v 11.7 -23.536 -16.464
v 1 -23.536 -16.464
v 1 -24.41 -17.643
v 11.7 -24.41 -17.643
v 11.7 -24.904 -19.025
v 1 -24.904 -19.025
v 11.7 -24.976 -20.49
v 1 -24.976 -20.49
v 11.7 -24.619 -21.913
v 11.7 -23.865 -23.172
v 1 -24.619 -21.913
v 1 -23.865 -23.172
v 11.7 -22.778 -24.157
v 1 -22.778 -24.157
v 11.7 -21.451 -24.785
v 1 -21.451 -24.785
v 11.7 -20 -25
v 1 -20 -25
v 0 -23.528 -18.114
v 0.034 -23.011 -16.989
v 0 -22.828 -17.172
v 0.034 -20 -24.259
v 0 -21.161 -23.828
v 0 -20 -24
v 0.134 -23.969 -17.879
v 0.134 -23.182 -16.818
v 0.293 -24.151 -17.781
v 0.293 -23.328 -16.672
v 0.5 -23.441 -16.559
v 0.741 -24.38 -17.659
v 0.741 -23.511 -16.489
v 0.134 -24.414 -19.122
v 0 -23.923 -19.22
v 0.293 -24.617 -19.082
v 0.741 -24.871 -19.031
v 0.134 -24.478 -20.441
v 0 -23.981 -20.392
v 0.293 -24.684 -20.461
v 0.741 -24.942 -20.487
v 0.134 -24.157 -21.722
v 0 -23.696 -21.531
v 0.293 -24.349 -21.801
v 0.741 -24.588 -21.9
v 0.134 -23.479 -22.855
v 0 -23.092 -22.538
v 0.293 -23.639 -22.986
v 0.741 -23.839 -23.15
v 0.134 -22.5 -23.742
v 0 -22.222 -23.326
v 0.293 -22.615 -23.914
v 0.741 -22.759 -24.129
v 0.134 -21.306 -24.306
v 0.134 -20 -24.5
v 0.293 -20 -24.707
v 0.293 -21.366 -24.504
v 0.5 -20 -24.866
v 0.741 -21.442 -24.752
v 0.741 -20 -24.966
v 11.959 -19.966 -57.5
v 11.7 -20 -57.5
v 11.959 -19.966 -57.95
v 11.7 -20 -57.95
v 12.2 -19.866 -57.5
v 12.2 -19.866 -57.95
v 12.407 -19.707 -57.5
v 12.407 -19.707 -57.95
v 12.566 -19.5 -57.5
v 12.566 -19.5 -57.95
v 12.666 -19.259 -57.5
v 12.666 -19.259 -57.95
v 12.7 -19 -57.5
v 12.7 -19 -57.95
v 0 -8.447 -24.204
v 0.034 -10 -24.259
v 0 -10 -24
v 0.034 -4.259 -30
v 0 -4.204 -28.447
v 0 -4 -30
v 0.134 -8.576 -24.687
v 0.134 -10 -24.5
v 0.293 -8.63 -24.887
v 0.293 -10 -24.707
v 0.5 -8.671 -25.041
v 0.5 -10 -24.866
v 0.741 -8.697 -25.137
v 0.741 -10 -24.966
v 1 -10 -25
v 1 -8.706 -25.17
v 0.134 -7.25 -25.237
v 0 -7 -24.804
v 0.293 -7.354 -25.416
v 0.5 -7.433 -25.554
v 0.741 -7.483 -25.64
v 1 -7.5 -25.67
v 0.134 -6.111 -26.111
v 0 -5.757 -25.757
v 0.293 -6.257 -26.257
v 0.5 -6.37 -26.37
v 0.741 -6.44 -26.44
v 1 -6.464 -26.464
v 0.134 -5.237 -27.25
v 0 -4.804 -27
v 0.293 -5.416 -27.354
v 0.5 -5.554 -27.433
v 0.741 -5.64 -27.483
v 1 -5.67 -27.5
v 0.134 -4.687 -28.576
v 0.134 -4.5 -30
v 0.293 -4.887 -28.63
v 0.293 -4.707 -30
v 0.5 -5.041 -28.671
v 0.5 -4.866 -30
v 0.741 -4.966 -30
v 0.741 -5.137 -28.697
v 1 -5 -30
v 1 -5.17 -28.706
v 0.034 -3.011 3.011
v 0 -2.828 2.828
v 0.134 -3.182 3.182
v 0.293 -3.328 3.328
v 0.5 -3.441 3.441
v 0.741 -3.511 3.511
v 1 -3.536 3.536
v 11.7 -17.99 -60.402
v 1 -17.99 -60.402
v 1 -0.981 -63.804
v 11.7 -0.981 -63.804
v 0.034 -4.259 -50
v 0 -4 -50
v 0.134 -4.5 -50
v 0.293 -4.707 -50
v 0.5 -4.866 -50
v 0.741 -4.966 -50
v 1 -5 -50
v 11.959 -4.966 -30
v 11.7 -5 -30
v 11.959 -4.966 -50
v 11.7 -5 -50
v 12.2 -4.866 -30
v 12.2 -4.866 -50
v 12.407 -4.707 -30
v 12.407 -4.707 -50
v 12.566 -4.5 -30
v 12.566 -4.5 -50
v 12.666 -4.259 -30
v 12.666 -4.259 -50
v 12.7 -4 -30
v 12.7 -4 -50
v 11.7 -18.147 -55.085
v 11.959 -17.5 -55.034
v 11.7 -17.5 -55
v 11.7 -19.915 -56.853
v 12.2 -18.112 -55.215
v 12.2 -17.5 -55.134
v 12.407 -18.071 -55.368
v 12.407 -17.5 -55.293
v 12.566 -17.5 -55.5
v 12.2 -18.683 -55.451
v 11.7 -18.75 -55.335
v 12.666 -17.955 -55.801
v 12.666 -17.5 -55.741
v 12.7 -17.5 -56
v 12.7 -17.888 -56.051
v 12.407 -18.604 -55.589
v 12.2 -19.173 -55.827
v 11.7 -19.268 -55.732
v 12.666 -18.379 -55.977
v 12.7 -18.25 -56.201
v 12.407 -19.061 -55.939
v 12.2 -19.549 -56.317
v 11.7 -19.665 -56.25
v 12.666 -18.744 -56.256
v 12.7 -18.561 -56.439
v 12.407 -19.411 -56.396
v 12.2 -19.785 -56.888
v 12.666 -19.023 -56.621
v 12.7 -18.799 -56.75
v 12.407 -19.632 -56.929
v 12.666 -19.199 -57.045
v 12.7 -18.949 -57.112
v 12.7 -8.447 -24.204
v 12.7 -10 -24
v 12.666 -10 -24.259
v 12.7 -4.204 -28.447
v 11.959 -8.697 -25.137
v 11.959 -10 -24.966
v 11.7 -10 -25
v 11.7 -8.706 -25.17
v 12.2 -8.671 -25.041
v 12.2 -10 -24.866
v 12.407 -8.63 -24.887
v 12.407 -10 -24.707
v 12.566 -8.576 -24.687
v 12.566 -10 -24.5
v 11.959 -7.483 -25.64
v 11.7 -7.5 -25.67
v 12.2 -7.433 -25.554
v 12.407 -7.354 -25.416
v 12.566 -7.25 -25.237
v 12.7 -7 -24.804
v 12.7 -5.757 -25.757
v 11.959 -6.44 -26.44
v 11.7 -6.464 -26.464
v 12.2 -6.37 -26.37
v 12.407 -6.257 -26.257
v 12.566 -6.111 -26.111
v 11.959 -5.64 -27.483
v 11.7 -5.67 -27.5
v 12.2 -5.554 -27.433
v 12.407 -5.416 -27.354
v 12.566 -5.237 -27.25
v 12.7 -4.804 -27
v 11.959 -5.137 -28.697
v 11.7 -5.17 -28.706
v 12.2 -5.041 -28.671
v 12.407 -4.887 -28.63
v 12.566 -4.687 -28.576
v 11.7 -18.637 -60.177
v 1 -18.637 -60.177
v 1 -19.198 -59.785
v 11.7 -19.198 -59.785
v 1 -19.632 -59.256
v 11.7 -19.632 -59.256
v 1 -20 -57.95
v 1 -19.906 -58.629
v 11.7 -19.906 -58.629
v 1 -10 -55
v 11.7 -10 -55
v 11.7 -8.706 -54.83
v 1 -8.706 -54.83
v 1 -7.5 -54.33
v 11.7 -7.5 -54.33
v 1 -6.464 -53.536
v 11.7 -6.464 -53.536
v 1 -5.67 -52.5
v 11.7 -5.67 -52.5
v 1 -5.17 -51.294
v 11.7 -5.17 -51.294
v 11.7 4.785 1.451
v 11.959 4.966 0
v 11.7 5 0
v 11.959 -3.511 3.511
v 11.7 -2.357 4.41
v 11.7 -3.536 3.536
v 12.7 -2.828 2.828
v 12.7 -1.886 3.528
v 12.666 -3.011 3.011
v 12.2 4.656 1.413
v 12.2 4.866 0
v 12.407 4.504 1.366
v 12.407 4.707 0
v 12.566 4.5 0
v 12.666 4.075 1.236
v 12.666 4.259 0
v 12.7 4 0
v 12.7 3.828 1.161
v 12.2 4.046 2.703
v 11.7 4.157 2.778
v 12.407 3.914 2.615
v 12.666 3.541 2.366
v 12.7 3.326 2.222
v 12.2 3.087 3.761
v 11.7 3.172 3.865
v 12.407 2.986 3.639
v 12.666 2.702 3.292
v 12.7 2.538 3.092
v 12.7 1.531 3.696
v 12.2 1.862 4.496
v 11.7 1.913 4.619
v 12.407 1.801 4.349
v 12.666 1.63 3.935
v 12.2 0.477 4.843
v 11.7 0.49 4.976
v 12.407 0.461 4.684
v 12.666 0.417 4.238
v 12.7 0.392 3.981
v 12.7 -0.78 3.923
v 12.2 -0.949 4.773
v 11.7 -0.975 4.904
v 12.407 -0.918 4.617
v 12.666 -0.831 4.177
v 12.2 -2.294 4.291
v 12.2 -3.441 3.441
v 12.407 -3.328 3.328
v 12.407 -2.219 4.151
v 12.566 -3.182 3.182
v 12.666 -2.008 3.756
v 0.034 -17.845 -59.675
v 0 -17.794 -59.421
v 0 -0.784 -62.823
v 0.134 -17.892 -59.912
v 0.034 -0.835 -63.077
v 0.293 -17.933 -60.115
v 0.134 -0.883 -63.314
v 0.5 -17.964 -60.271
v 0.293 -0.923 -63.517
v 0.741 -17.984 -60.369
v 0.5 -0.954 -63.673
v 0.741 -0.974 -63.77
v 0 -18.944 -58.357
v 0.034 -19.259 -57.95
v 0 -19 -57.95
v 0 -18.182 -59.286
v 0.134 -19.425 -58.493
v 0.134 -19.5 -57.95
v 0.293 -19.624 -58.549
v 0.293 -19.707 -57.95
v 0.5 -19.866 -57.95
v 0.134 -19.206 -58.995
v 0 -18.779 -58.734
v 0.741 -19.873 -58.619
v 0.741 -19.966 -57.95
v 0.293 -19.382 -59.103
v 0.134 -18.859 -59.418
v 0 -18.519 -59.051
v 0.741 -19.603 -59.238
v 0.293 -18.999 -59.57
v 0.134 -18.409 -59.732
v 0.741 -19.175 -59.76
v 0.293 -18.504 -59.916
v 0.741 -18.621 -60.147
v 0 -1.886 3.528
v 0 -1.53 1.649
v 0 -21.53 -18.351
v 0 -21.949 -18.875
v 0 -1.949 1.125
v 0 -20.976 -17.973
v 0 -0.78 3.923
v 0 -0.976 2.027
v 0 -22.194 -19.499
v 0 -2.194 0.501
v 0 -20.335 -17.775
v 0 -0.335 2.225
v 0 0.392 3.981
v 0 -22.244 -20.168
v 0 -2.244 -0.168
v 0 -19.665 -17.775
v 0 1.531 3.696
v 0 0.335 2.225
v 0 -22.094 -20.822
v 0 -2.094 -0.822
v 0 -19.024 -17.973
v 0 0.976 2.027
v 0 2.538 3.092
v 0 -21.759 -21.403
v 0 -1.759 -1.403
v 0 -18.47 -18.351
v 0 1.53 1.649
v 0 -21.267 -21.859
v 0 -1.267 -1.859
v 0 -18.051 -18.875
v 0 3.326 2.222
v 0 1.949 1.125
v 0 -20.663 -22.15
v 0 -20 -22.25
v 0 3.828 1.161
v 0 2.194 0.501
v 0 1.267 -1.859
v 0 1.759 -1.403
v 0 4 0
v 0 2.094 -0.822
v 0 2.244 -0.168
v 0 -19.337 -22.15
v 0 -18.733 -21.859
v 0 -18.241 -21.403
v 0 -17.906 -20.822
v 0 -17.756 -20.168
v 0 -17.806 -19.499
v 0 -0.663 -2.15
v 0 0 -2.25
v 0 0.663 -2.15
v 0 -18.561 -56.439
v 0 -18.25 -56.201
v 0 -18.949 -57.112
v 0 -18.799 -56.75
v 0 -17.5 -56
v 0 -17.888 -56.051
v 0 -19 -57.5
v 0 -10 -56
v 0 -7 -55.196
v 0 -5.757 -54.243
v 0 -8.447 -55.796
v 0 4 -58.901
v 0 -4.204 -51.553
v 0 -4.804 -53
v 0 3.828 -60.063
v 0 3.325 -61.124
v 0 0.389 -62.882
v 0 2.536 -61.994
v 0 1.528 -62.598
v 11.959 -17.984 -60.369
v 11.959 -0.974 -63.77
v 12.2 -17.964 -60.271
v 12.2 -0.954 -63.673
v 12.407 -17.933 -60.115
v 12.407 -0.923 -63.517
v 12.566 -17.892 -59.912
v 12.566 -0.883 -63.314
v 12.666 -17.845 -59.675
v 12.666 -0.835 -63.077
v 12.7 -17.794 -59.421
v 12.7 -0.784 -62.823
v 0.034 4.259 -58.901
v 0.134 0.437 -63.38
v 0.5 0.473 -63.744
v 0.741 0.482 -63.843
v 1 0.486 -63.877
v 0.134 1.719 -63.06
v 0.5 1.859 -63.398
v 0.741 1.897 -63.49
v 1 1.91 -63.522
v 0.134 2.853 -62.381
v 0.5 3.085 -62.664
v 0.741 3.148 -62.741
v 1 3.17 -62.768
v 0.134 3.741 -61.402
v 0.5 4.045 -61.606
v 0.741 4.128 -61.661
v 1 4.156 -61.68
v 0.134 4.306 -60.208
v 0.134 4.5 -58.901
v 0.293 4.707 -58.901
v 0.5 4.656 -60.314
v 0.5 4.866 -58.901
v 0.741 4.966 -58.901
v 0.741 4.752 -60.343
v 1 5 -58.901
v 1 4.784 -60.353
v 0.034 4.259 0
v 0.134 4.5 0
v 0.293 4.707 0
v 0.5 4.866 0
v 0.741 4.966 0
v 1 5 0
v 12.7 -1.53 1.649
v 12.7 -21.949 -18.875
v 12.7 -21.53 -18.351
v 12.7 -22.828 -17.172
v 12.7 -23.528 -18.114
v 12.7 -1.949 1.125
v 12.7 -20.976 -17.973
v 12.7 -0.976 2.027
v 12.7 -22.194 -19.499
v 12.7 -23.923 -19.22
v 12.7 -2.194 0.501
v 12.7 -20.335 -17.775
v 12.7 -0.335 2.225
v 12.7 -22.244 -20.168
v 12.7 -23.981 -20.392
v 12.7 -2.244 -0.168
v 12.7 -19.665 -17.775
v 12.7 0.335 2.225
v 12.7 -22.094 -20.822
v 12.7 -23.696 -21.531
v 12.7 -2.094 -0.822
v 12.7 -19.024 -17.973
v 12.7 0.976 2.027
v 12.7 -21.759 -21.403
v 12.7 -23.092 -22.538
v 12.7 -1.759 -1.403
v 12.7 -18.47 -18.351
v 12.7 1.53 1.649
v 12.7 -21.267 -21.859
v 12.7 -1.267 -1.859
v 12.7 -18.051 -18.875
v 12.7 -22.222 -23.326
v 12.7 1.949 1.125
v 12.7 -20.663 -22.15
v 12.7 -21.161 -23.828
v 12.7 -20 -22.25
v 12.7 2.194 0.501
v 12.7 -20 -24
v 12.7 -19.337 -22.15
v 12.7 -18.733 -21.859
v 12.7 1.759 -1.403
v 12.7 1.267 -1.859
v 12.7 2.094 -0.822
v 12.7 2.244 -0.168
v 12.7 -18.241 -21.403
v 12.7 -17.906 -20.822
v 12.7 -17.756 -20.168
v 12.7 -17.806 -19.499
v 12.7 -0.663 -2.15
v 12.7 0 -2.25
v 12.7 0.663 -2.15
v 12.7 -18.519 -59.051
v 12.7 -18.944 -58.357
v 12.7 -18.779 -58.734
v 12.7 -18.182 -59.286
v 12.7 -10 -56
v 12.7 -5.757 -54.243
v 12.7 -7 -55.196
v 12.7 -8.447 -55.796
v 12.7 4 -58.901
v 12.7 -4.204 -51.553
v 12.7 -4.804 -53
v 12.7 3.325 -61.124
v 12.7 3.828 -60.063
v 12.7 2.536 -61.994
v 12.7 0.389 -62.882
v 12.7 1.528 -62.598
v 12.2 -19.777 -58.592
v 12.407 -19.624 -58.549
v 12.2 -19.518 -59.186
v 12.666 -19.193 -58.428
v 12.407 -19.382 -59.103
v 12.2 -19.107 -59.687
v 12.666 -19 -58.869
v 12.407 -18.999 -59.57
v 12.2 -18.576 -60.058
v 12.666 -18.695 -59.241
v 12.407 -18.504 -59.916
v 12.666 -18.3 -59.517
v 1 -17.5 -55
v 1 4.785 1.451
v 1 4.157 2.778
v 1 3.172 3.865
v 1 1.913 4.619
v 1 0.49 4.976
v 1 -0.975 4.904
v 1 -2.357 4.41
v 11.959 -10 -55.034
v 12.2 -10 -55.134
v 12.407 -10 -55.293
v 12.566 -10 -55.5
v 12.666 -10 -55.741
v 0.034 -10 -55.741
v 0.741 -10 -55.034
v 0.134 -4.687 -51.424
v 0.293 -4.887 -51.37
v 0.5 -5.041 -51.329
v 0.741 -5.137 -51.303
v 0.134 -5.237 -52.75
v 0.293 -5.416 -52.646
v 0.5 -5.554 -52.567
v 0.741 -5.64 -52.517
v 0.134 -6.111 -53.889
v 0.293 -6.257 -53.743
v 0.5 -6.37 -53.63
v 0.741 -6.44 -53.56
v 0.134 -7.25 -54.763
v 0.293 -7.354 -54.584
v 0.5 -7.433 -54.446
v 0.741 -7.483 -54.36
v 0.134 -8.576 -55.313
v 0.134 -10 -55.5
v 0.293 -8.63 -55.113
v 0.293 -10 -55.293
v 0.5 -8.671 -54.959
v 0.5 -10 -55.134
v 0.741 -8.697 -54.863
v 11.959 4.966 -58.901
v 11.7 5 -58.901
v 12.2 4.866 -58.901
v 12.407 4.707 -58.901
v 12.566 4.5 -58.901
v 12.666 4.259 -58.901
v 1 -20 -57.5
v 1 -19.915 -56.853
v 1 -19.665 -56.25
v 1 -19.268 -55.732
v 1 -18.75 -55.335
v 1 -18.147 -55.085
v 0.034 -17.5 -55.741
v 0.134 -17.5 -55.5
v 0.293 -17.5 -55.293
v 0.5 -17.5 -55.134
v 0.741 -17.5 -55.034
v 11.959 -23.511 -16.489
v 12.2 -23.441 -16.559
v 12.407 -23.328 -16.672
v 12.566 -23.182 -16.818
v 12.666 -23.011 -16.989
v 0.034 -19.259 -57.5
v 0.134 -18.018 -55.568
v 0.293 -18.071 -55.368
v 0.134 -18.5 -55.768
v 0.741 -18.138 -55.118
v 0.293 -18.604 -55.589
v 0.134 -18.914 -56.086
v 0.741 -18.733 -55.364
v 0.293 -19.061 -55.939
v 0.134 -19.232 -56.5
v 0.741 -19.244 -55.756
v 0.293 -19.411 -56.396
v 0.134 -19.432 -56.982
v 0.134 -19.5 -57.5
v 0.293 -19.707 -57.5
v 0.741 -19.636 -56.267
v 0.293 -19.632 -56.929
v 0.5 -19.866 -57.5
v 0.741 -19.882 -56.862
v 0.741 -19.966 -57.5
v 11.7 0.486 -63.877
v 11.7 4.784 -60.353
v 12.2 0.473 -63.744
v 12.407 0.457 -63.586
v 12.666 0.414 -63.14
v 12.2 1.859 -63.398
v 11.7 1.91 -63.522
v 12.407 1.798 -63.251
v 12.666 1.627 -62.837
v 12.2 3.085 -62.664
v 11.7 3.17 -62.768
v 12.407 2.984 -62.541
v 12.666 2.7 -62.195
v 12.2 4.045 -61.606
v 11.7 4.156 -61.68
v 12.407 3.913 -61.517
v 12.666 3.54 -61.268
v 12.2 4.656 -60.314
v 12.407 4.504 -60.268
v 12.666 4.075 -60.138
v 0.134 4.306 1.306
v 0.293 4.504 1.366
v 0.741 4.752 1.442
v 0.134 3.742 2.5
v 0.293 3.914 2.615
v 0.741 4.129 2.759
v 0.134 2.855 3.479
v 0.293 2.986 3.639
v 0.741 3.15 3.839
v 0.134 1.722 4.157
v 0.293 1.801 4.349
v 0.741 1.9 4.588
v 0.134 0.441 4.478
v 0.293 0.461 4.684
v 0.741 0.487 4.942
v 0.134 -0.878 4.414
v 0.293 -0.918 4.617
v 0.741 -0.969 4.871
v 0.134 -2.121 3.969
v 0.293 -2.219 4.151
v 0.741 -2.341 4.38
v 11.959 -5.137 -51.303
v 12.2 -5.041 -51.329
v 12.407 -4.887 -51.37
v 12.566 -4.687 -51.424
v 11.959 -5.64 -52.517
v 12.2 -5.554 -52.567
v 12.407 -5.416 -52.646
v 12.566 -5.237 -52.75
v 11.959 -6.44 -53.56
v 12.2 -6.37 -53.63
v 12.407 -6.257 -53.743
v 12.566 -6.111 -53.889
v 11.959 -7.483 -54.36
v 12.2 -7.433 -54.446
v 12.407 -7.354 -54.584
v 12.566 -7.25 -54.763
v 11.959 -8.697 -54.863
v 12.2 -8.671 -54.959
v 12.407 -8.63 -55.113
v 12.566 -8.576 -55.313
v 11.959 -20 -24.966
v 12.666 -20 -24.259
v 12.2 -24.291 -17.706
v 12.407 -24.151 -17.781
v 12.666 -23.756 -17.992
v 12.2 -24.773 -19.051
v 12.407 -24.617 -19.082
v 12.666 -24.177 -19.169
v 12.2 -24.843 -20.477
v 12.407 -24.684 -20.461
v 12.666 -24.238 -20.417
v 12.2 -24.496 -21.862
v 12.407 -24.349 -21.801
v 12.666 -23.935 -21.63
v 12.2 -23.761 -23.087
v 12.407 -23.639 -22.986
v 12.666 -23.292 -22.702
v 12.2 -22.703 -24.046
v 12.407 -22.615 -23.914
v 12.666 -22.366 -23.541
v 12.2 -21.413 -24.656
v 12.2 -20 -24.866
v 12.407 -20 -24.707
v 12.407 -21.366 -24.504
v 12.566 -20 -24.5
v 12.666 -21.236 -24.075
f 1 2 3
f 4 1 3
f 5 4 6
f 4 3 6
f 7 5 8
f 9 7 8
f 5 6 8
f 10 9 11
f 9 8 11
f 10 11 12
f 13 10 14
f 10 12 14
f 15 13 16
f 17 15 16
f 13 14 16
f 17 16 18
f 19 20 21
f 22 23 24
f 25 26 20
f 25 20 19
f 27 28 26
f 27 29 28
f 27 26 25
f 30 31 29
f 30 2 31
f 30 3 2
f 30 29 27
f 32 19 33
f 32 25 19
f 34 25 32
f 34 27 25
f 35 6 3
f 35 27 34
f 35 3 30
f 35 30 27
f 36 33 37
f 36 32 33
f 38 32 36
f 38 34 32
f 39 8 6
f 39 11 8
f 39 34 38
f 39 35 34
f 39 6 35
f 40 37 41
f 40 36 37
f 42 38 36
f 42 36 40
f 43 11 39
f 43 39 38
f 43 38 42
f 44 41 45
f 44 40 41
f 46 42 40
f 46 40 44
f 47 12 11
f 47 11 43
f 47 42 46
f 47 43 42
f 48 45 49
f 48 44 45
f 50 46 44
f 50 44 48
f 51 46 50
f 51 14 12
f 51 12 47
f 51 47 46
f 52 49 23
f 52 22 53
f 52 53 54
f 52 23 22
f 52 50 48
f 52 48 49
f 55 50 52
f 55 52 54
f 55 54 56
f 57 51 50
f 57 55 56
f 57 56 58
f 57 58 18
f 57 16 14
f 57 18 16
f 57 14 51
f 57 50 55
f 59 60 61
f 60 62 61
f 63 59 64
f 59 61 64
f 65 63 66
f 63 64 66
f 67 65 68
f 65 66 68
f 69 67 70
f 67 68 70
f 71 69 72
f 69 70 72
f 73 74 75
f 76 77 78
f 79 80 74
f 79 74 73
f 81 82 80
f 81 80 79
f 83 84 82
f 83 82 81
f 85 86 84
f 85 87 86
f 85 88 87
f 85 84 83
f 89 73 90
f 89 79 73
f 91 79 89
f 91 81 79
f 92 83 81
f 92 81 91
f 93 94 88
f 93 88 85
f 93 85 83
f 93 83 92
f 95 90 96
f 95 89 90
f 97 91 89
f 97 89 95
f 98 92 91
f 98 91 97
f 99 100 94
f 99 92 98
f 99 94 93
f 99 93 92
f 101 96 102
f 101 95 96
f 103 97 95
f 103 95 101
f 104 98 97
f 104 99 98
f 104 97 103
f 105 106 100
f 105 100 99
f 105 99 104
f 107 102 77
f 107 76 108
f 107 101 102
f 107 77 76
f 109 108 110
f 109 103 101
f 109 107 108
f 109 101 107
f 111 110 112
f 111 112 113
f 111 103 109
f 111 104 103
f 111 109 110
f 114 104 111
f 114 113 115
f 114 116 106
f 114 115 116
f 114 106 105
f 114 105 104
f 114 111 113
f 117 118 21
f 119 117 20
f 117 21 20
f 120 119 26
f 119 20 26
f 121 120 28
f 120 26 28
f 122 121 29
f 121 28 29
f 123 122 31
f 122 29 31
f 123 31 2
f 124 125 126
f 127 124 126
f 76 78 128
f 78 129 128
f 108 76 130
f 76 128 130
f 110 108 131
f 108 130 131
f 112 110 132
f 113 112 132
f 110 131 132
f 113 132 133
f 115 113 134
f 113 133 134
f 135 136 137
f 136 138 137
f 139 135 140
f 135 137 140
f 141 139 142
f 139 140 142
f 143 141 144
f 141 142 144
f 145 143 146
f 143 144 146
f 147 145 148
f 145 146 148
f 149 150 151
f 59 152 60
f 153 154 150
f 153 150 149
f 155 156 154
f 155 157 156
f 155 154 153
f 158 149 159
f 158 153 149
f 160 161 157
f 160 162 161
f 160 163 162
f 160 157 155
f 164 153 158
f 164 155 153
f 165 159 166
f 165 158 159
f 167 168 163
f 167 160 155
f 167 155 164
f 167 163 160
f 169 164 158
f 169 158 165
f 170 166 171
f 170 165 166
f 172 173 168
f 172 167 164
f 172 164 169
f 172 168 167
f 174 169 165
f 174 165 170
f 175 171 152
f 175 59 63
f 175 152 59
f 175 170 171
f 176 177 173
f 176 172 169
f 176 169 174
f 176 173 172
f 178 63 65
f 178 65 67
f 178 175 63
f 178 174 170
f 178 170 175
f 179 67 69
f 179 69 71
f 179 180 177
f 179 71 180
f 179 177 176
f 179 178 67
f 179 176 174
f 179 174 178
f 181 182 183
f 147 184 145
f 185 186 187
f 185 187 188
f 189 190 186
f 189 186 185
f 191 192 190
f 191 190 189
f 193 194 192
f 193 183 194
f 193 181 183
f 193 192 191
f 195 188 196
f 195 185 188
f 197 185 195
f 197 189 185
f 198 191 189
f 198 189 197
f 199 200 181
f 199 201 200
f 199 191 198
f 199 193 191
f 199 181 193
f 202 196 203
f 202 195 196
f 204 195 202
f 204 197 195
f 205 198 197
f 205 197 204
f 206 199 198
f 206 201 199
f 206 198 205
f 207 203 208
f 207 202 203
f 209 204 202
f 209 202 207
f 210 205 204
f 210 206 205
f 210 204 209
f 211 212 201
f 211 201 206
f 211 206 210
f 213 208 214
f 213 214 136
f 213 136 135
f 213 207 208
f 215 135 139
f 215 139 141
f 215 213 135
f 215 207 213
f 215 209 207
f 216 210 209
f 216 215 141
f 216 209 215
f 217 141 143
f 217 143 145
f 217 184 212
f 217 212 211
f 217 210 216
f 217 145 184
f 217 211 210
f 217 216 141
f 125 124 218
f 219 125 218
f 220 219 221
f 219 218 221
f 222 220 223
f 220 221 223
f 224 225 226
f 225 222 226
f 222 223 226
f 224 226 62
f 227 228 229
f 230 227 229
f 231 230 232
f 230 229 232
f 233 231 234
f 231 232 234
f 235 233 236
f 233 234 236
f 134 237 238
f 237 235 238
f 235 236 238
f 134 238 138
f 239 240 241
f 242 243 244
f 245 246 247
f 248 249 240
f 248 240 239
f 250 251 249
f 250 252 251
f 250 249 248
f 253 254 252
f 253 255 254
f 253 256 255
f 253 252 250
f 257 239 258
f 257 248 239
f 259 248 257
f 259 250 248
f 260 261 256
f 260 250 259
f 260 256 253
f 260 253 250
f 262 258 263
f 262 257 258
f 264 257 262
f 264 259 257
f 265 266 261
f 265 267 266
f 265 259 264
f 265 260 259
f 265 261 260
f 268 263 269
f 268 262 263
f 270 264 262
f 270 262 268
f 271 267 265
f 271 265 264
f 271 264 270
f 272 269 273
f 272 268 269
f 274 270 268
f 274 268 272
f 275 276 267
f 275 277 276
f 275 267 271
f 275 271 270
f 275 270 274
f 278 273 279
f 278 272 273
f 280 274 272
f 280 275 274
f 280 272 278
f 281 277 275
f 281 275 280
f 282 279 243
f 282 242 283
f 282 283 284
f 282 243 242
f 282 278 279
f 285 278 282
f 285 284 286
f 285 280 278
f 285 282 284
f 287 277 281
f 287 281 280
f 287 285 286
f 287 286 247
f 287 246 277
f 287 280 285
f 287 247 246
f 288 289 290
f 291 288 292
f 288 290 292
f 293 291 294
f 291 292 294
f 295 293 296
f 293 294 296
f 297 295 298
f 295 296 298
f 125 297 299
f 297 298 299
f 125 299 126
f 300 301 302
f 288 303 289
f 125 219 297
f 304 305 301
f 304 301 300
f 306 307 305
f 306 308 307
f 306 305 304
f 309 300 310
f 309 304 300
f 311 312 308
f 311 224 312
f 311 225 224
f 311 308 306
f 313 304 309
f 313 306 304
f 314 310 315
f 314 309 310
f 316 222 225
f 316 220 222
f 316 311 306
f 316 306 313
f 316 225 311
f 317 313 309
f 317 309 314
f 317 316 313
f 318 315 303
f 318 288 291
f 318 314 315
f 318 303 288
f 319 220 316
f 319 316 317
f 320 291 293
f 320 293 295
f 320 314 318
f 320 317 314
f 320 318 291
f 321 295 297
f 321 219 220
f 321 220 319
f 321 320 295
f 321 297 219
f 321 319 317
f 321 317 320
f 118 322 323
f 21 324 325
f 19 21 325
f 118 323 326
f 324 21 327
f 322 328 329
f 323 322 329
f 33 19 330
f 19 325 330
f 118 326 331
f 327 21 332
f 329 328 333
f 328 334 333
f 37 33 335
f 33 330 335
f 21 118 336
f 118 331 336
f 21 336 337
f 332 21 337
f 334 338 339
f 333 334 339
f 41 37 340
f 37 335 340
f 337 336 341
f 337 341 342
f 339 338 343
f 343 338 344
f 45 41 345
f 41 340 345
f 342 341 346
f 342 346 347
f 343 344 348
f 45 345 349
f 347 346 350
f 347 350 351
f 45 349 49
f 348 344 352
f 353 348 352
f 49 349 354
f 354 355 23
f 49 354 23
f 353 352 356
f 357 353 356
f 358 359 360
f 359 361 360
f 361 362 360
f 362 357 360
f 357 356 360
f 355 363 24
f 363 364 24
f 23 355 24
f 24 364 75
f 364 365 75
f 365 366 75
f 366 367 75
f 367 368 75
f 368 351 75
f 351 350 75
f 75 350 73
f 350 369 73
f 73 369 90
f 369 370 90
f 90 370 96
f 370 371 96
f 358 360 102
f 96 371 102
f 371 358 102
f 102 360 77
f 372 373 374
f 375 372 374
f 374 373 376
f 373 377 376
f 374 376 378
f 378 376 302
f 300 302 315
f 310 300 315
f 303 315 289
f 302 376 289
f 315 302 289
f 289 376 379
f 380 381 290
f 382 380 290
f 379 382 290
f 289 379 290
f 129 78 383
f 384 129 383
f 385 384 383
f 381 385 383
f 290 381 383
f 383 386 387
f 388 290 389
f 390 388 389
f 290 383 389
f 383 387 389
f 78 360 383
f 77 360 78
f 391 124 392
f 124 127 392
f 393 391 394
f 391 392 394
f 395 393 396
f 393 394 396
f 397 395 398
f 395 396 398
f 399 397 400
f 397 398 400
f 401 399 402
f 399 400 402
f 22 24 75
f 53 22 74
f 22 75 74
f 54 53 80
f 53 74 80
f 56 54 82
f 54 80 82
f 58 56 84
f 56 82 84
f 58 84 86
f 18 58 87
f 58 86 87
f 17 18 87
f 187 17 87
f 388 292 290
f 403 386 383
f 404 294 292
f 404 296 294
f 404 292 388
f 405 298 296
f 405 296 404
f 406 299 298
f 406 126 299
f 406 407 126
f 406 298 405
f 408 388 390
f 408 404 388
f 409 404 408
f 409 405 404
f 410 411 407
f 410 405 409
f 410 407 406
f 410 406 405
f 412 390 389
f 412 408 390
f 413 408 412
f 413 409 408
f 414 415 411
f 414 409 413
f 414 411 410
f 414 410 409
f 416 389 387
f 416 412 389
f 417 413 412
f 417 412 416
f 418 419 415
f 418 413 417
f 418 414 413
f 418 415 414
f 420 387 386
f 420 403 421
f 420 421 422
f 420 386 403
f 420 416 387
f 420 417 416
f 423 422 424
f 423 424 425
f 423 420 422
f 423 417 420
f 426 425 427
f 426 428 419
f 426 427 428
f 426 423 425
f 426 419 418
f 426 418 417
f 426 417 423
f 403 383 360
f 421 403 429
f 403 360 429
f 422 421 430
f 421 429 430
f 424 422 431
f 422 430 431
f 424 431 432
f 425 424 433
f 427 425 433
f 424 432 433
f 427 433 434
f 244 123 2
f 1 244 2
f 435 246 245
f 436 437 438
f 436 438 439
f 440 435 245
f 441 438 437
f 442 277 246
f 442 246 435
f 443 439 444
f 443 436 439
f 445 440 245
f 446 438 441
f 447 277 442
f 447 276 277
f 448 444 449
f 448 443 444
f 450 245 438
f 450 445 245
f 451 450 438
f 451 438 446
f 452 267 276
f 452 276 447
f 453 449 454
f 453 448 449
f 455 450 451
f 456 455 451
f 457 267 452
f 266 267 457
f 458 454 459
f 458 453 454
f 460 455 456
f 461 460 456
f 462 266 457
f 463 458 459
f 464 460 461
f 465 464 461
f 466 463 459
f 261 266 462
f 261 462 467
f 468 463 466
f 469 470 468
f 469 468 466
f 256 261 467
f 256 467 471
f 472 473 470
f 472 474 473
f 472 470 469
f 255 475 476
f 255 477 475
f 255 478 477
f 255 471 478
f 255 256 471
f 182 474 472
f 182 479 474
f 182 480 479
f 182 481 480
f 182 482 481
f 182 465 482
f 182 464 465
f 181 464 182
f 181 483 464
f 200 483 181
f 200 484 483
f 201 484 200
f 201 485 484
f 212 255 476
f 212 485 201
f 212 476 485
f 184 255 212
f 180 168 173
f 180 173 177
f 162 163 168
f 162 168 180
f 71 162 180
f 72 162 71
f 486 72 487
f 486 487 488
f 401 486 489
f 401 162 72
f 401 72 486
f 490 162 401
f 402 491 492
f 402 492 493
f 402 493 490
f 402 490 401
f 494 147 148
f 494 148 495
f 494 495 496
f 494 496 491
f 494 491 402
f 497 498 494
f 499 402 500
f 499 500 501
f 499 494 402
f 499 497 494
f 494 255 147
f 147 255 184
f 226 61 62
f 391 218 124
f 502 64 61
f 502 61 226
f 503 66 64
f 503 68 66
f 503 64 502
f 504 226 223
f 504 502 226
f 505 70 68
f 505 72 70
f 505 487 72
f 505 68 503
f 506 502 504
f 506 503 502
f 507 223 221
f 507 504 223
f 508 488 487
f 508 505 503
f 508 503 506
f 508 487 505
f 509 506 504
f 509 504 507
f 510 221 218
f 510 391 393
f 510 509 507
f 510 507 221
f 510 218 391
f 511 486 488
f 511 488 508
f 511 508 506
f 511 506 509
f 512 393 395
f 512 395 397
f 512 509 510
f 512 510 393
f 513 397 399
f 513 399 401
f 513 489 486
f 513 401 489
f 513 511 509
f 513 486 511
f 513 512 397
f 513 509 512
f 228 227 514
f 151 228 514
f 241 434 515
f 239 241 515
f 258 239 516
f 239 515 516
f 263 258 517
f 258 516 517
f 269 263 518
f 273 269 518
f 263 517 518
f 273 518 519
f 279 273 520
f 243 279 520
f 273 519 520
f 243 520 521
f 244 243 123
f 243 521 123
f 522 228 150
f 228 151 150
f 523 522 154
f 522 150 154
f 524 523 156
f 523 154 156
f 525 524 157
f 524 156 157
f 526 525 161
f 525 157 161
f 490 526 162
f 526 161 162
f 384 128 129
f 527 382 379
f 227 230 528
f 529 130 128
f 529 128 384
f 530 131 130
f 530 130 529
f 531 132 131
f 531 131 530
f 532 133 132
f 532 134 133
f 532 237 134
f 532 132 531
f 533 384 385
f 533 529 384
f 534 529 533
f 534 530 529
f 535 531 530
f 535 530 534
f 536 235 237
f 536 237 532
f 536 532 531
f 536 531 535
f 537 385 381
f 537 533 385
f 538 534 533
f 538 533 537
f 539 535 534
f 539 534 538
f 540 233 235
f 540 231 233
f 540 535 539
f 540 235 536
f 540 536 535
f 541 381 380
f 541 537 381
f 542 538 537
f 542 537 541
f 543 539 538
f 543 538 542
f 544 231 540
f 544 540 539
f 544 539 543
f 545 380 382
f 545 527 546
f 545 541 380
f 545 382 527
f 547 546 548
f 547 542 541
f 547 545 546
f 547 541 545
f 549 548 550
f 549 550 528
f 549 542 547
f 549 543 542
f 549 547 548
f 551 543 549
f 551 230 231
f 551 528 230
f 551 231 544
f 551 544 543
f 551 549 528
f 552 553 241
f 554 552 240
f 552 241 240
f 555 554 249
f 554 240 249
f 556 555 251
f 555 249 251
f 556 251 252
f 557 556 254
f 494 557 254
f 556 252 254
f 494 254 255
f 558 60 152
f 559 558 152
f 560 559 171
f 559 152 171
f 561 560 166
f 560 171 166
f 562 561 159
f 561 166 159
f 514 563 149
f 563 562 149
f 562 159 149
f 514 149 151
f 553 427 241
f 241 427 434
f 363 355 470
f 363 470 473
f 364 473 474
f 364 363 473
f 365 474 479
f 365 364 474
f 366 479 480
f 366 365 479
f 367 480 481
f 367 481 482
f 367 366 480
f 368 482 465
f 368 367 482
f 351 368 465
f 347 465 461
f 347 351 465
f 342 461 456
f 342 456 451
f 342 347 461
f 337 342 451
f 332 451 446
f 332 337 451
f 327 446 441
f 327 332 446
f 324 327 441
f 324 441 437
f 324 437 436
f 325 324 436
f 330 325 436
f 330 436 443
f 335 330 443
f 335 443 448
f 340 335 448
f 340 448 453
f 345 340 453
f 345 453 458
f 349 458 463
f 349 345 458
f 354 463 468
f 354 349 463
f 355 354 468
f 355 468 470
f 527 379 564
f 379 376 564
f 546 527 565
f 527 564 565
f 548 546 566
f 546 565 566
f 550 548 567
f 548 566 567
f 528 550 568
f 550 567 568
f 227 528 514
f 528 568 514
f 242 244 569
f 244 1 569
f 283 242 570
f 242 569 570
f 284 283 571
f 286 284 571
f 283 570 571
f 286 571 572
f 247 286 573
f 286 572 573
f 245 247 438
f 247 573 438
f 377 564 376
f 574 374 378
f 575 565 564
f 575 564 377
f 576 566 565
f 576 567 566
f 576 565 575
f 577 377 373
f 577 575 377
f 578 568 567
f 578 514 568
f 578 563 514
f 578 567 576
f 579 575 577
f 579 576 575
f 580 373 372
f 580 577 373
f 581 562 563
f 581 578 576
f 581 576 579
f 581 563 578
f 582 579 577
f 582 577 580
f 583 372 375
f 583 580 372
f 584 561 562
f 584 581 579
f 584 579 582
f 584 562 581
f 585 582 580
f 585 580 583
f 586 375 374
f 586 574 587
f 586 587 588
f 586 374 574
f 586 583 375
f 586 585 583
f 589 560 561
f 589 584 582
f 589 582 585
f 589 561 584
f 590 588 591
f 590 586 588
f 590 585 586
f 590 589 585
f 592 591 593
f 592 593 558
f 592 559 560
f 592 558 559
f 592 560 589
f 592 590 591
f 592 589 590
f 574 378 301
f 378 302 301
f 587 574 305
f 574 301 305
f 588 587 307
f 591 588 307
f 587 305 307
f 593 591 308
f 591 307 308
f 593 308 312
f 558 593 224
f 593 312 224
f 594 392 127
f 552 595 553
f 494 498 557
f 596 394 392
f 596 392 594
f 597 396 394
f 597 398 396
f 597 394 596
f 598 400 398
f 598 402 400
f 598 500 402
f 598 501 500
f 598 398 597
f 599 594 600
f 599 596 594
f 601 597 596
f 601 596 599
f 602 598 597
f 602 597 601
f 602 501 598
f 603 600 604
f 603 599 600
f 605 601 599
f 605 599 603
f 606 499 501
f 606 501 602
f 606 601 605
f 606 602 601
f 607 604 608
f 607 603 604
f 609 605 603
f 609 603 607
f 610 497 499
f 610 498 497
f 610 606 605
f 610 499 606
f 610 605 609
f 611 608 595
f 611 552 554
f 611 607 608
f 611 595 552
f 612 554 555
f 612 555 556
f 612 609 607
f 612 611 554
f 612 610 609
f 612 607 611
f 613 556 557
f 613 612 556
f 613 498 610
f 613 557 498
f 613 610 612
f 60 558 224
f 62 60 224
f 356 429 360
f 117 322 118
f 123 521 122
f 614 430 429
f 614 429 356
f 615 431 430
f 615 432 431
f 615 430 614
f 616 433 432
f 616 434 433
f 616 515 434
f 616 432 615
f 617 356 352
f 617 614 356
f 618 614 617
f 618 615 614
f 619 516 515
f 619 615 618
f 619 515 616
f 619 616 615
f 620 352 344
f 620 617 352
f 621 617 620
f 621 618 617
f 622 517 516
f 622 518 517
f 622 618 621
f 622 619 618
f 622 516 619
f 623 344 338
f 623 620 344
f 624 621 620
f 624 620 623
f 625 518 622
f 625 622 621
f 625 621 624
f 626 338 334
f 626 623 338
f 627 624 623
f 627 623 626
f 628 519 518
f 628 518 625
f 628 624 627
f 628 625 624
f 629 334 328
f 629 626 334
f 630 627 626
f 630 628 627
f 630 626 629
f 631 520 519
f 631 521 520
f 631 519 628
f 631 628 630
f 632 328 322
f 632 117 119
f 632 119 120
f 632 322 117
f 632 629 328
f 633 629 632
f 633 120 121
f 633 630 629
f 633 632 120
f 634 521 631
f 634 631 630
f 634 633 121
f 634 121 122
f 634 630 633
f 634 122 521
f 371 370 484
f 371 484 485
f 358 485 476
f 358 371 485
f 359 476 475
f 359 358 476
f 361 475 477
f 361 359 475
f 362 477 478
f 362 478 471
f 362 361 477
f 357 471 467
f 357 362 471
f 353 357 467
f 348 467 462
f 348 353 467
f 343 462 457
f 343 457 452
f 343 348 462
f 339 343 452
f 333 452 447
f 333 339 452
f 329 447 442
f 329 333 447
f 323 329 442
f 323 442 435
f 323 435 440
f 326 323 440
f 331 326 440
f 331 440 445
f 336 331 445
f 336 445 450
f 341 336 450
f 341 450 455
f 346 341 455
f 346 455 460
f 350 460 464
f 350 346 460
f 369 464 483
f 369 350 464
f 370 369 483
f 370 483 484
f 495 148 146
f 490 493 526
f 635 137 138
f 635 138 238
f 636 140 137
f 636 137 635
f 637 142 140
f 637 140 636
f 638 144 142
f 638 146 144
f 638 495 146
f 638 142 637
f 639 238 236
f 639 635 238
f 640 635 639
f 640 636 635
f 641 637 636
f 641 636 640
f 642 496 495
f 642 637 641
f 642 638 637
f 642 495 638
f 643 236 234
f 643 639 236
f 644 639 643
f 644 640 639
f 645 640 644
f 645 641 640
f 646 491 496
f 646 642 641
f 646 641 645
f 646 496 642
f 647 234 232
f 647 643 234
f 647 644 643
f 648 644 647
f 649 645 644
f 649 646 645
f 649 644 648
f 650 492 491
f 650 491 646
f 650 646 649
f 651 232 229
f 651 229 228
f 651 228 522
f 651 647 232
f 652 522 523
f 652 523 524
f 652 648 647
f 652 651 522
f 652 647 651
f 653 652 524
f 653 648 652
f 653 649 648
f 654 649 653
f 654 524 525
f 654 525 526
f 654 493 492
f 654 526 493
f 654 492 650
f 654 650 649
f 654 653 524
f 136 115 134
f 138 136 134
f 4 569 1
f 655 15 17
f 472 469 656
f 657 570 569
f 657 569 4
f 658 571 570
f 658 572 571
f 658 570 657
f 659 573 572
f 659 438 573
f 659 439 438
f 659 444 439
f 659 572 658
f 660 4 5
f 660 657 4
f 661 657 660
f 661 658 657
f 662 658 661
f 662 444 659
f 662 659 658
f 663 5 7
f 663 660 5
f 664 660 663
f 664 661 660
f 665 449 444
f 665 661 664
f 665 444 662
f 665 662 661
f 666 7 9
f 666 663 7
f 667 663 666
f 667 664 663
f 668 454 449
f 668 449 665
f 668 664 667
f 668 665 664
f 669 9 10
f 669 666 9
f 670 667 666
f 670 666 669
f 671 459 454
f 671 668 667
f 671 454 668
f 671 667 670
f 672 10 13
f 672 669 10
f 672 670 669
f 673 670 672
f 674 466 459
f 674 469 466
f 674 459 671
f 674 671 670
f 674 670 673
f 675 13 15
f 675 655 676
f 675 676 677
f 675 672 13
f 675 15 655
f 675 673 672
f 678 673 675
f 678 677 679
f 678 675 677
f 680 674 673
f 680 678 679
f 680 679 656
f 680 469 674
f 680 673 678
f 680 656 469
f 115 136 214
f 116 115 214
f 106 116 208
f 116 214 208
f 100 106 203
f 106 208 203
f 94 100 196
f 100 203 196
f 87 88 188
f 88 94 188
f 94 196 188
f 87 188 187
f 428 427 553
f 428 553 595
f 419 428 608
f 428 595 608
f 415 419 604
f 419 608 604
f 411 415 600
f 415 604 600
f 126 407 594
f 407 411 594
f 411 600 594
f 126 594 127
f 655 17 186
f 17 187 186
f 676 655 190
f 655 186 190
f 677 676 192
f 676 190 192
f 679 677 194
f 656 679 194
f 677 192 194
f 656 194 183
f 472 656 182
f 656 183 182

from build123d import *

# Parameters (mm, degrees)
SKETCH1_R           = 2.25
BOSS_EXTRUDE1_DEPTH = 12.7
FILLET1_R           = 5
FILLET2_R           = 2.5
FILLET3_R           = 1


with BuildPart() as part:
    # Sketch1 → Boss-Extrude1 (new body)
    with BuildSketch(Plane(origin=(0, 0, 0), x_dir=(0, 0, -1), z_dir=(1, 0, 0))):
        with BuildLine():
            Line((65, 5), (0, 5))
            ThreePointArc((0, 5), (-4.619397663, 1.913417162), (-3.535533906, -3.535533906))
            Line((-3.535533906, -3.535533906), (16.464466094, -23.535533906))
            ThreePointArc((16.464466094, -23.535533906), (21.913417162, -24.619397663), (25, -20))
            Line((25, -20), (25, -5))
            Line((25, -5), (55, -5))
            Line((55, -5), (55, -20))
            Line((55, -20), (60, -20))
            Line((60, -20), (65, 5))
        make_face()
        Circle(SKETCH1_R, mode=Mode.SUBTRACT)
        with Locations((20, -20)):
            Circle(SKETCH1_R, mode=Mode.SUBTRACT)
    extrude(amount=BOSS_EXTRUDE1_DEPTH)

    # Fillet1
    fillet1_edges = [part.edges().sort_by_distance(p)[0] for p in [
        (6.35, 5, -65),
        (6.35, -5, -55),
        (6.35, -5, -25),
    ]]
    fillet(fillet1_edges, radius=FILLET1_R)

    # Fillet2
    fillet2_edges = [part.edges().sort_by_distance(p)[0] for p in [
        (6.35, -20, -60),
        (6.35, -20, -55),
    ]]
    fillet(fillet2_edges, radius=FILLET2_R)

    # Fillet3
    fillet3_edges = [part.edges().sort_by_distance(p)[0] for p in [
        (12.7, 1.913417162, 4.619397663),
        (0, 5, -29.450490243),
        (0, -24.619397663, -21.913417162),
        (12.7, -13.535533906, -6.464466094),
        (0, -13.535533906, -6.464466094),
        (0, 1.913417162, 4.619397663),
        (12.7, -24.619397663, -21.913417162),
        (0, -5, -40),
        (12.7, -5, -40),
        (0, -15, -25),
        (0, 3.169944528, -62.767691193),
        (12.7, -15, -25),
        (12.7, 3.169944528, -62.767691193),
        (0, -6.464466094, -53.535533906),
        (12.7, -6.464466094, -53.535533906),
        (0, -6.464466094, -26.464466094),
        (12.7, -6.464466094, -26.464466094),
        (12.7, 5, -29.450490243),
        (0, -9.485435507, -62.102912899),
        (12.7, -9.485435507, -62.102912899),
        (0, -20, -57.725245122),
        (0, -13.75, -55),
        (0, -19.267766953, -55.732233047),
        (0, -19.433355353, -59.535462507),
        (12.7, -20, -57.725245122),
        (12.7, -13.75, -55),
        (12.7, -19.267766953, -55.732233047),
        (12.7, -19.433355353, -59.535462507),
    ]]
    fillet(fillet3_edges, radius=FILLET3_R)


solid = part.part
